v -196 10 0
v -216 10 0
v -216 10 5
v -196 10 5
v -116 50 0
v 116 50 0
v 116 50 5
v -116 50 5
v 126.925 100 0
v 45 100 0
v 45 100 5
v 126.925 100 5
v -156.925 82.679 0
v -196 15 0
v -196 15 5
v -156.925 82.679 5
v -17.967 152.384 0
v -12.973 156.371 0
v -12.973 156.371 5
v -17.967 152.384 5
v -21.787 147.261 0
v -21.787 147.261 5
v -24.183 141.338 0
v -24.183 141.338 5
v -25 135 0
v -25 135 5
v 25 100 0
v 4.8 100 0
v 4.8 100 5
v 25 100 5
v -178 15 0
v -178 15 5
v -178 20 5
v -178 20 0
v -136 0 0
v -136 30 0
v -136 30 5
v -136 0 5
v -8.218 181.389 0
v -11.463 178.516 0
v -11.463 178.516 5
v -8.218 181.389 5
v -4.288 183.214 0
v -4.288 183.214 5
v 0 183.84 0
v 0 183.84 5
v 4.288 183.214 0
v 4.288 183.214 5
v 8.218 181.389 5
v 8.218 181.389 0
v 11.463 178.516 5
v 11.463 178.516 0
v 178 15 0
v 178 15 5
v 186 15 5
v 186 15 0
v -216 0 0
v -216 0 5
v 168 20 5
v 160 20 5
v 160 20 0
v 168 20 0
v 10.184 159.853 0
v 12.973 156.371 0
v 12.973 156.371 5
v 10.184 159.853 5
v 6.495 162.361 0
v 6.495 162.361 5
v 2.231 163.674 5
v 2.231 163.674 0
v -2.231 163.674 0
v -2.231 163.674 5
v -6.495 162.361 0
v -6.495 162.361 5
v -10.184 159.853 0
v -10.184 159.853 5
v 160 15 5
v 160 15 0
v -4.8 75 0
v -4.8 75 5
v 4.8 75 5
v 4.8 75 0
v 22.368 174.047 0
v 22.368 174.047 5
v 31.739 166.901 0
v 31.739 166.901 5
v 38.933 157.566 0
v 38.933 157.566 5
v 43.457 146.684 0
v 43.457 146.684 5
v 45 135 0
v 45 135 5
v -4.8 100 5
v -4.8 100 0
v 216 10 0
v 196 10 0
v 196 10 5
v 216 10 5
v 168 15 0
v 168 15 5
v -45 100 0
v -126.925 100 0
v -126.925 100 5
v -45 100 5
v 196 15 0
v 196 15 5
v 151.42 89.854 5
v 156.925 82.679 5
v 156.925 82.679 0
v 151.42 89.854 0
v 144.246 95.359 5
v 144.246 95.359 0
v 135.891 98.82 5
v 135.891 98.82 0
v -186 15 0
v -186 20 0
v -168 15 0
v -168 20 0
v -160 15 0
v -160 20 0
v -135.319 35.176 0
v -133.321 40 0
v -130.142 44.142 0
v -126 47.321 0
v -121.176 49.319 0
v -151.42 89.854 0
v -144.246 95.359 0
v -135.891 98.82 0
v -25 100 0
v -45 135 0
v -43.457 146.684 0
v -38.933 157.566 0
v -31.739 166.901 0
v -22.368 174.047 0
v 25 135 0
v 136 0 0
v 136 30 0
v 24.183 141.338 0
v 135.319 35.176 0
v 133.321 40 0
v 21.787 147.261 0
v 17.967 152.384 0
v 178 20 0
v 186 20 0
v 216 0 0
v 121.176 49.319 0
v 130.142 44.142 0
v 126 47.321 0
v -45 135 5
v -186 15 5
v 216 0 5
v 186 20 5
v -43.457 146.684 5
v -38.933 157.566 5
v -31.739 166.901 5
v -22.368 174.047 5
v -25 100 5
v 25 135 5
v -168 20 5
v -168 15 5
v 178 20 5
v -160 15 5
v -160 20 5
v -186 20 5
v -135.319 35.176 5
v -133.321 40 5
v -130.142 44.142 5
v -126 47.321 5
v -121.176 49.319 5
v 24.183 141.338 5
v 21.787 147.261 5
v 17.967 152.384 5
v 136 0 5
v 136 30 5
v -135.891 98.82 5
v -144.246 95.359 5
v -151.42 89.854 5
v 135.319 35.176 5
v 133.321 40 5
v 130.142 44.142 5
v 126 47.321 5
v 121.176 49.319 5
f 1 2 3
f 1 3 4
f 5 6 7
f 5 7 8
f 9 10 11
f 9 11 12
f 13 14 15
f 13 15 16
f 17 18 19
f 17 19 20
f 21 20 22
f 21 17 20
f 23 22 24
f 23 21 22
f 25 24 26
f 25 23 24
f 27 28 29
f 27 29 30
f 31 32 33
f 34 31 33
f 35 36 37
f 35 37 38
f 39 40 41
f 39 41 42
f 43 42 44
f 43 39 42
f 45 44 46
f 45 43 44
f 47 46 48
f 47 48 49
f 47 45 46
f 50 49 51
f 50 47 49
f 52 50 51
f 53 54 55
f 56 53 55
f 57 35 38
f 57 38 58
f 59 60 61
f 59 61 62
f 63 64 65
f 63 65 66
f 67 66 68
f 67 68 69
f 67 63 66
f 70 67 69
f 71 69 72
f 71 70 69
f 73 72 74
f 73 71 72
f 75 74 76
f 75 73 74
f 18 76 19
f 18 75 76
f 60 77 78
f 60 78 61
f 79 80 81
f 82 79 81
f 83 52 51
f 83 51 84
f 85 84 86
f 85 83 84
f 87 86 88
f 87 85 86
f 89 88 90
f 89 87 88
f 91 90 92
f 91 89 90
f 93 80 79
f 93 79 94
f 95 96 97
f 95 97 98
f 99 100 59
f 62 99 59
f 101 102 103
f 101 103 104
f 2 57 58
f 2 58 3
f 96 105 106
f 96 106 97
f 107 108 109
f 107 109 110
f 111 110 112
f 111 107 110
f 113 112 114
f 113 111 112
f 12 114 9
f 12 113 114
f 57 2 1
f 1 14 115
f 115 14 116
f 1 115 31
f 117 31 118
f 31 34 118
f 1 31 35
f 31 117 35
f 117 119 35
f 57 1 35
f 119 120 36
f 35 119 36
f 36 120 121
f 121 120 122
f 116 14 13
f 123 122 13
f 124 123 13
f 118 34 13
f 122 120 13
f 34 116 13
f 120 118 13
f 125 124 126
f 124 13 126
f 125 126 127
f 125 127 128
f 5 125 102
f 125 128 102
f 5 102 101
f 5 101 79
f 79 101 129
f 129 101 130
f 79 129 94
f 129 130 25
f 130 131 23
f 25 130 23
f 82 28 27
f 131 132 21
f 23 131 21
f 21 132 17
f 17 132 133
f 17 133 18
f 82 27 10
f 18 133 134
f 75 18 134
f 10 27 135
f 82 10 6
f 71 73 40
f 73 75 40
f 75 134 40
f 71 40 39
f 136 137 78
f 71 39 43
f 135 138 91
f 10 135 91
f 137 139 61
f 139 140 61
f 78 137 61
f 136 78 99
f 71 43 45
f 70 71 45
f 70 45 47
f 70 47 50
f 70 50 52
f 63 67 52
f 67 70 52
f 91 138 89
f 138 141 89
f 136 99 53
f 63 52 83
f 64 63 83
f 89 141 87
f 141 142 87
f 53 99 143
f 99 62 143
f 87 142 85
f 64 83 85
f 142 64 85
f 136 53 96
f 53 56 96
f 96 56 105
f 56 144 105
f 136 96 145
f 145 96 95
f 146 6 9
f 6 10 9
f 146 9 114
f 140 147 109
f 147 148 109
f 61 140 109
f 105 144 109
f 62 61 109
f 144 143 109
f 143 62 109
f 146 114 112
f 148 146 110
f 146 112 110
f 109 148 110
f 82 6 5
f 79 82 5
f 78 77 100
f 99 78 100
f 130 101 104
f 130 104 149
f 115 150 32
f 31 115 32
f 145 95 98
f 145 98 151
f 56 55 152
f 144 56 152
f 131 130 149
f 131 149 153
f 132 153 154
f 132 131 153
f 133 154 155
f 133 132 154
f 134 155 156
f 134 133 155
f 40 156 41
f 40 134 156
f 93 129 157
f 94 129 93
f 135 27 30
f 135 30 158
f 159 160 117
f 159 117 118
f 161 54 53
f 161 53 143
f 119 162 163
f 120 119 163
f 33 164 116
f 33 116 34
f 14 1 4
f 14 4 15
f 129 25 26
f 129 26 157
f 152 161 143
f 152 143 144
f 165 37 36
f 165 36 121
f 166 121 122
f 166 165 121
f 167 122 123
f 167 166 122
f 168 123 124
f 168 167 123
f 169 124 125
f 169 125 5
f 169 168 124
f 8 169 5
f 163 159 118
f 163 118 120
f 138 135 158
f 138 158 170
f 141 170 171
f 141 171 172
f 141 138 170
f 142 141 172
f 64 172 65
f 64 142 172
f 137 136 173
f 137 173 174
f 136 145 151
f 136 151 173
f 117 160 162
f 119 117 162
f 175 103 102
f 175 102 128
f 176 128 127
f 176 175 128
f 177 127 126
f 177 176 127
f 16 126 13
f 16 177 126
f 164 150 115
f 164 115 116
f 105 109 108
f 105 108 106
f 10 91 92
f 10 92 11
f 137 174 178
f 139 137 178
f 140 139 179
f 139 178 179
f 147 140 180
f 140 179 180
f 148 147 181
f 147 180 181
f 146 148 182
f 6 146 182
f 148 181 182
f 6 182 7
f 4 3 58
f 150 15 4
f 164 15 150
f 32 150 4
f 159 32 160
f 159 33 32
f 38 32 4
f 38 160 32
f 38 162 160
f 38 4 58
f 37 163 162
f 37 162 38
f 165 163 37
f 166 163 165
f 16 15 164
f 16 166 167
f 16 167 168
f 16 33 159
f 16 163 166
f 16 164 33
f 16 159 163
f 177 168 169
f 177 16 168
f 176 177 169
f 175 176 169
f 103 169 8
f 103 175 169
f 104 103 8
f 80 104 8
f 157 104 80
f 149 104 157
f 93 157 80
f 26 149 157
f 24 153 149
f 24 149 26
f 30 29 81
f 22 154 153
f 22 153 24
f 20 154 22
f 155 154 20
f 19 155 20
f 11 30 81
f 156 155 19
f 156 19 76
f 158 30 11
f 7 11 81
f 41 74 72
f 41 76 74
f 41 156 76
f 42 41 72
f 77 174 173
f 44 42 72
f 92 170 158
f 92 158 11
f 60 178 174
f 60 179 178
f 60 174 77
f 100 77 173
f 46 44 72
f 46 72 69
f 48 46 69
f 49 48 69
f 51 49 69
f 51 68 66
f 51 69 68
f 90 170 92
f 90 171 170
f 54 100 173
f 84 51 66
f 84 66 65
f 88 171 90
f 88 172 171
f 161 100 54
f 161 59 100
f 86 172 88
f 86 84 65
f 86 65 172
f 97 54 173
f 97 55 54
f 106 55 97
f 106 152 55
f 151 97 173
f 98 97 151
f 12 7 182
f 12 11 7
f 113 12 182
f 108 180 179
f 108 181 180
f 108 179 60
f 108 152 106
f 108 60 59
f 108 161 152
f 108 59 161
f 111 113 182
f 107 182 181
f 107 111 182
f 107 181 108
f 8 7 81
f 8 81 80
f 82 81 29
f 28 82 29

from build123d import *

# Parameters (mm, degrees)
EXTRUDE_1_DEPTH     = 5
CUT_EXTRUDE_1_REACH = 7
EXTRUDE_2_DEPTH     = 5
CUT_EXTRUDE_2_REACH = 7
SKETCH_4_W          = 9.6
SKETCH_4_H          = 50
EXTRUDE_3_DEPTH     = 5
CUT_EXTRUDE_3_REACH = 7
SKETCH_6_W          = 8
SKETCH_6_H          = 5


with BuildPart() as part:
    # 草图1 → 凸台-拉伸1 (new body)
    with BuildSketch(Plane.XY):
        Polygon((-216, 0), (-216, 10), (-196, 10), (-196, 15), (-146.925227119, 100), (146.925227119, 100), (196, 15), (196, 10), (216, 10), (216, 0), (136, 0), (136, 50), (-136, 50), (-136, 0), align=None)
    extrude(amount=EXTRUDE_1_DEPTH)

    # 草图2 → 切除-拉伸1 (cut, up to next)
    with BuildSketch(Plane.XY.offset(5), mode=Mode.PRIVATE) as cut_extrude_1_sk1:
        with BuildLine():
            Line((-146.925227119, 100), (-126.925227119, 100))
            ThreePointArc((-126.925227119, 100), (-144.245735195, 95.358983849), (-156.925227119, 82.679491924))
            Line((-156.925227119, 82.679491924), (-146.925227119, 100))
        make_face()
    cut_extrude_1_tool1 = extrude(cut_extrude_1_sk1.sketch, amount=-CUT_EXTRUDE_1_REACH, mode=Mode.PRIVATE) & part.part
    add(cut_extrude_1_tool1.solids().sort_by_distance((-144.827064, 96.365874, 5))[0], mode=Mode.SUBTRACT)
    # 草图2 → 切除-拉伸1 (cut, up to next)
    with BuildSketch(Plane.XY.offset(5), mode=Mode.PRIVATE) as cut_extrude_1_sk2:
        with BuildLine():
            Line((146.925227119, 100), (156.925227119, 82.679491924))
            ThreePointArc((156.925227119, 82.679491924), (144.245735195, 95.358983849), (126.925227119, 100))
            Line((126.925227119, 100), (146.925227119, 100))
        make_face()
    cut_extrude_1_tool2 = extrude(cut_extrude_1_sk2.sketch, amount=-CUT_EXTRUDE_1_REACH, mode=Mode.PRIVATE) & part.part
    add(cut_extrude_1_tool2.solids().sort_by_distance((144.827064, 96.365874, 5))[0], mode=Mode.SUBTRACT)

    # 草图3 → 凸台-拉伸2 (add)
    with BuildSketch(Plane.XY.offset(5)):
        with BuildLine():
            Line((-116, 50), (-136, 50))
            Line((-136, 50), (-136, 30))
            ThreePointArc((-136, 30), (-130.142135624, 44.142135624), (-116, 50))
        make_face()
        with BuildLine():
            Line((136, 50), (136, 30))
            ThreePointArc((136, 30), (130.142135624, 44.142135624), (116, 50))
            Line((116, 50), (136, 50))
        make_face()
    extrude(amount=-EXTRUDE_2_DEPTH)

    # 草图4 → 切除-拉伸2 (cut, up to next)
    with BuildSketch(Plane.XY.offset(5), mode=Mode.PRIVATE) as cut_extrude_2_sk1:
        with Locations((0, 100)):
            Rectangle(SKETCH_4_W, SKETCH_4_H)
    cut_extrude_2_tool1 = extrude(cut_extrude_2_sk1.sketch, amount=-CUT_EXTRUDE_2_REACH, mode=Mode.PRIVATE) & part.part
    add(cut_extrude_2_tool1.solids().sort_by_distance((0, 100, 5))[0], mode=Mode.SUBTRACT)

    # 草图5 → 凸台-拉伸3 (add)
    with BuildSketch(Plane(origin=(0, 0, 0), x_dir=(-1, 0, 0), z_dir=(0, 0, -1))):
        with BuildLine():
            Line((45, 100), (45, 135))
            ThreePointArc((45, 135), (35.642806819, 162.469807463), (11.462652354, 178.515601811))
            ThreePointArc((11.462652354, 178.515601811), (0, 183.840499693), (-11.462652354, 178.515601811))
            ThreePointArc((-11.462652354, 178.515601811), (-35.642806819, 162.469807463), (-45, 135))
            Line((-45, 135), (-45, 100))
            Line((-45, 100), (-25, 100))
            Line((-25, 100), (-25, 135))
            ThreePointArc((-25, 135), (-21.786738765, 147.261240312), (-12.97295888, 156.370595169))
            ThreePointArc((-12.97295888, 156.370595169), (0, 163.840499693), (12.97295888, 156.370595169))
            ThreePointArc((12.97295888, 156.370595169), (21.786738765, 147.261240312), (25, 135))
            Line((25, 135), (25, 100))
            Line((25, 100), (45, 100))
        make_face()
    extrude(amount=-EXTRUDE_3_DEPTH)

    # 草图6 → 切除-拉伸3 (cut, up to next)
    with BuildSketch(Plane.XY.offset(5), mode=Mode.PRIVATE) as cut_extrude_3_sk1:
        with Locations((-182, 17.5)):
            Rectangle(SKETCH_6_W, SKETCH_6_H)
    cut_extrude_3_tool1 = extrude(cut_extrude_3_sk1.sketch, amount=-CUT_EXTRUDE_3_REACH, mode=Mode.PRIVATE) & part.part
    add(cut_extrude_3_tool1.solids().sort_by_distance((-182, 17.5, 5))[0], mode=Mode.SUBTRACT)
    # 草图6 → 切除-拉伸3 (cut, up to next)
    with BuildSketch(Plane.XY.offset(5), mode=Mode.PRIVATE) as cut_extrude_3_sk2:
        with Locations((-164, 17.5)):
            Rectangle(SKETCH_6_W, SKETCH_6_H)
    cut_extrude_3_tool2 = extrude(cut_extrude_3_sk2.sketch, amount=-CUT_EXTRUDE_3_REACH, mode=Mode.PRIVATE) & part.part
    add(cut_extrude_3_tool2.solids().sort_by_distance((-164, 17.5, 5))[0], mode=Mode.SUBTRACT)
    # 草图6 → 切除-拉伸3 (cut, up to next)
    with BuildSketch(Plane.XY.offset(5), mode=Mode.PRIVATE) as cut_extrude_3_sk3:
        with Locations((182, 17.5)):
            Rectangle(SKETCH_6_W, SKETCH_6_H)
    cut_extrude_3_tool3 = extrude(cut_extrude_3_sk3.sketch, amount=-CUT_EXTRUDE_3_REACH, mode=Mode.PRIVATE) & part.part
    add(cut_extrude_3_tool3.solids().sort_by_distance((182, 17.5, 5))[0], mode=Mode.SUBTRACT)
    # 草图6 → 切除-拉伸3 (cut, up to next)
    with BuildSketch(Plane.XY.offset(5), mode=Mode.PRIVATE) as cut_extrude_3_sk4:
        with Locations((164, 17.5)):
            Rectangle(SKETCH_6_W, SKETCH_6_H)
    cut_extrude_3_tool4 = extrude(cut_extrude_3_sk4.sketch, amount=-CUT_EXTRUDE_3_REACH, mode=Mode.PRIVATE) & part.part
    add(cut_extrude_3_tool4.solids().sort_by_distance((164, 17.5, 5))[0], mode=Mode.SUBTRACT)


solid = part.part
